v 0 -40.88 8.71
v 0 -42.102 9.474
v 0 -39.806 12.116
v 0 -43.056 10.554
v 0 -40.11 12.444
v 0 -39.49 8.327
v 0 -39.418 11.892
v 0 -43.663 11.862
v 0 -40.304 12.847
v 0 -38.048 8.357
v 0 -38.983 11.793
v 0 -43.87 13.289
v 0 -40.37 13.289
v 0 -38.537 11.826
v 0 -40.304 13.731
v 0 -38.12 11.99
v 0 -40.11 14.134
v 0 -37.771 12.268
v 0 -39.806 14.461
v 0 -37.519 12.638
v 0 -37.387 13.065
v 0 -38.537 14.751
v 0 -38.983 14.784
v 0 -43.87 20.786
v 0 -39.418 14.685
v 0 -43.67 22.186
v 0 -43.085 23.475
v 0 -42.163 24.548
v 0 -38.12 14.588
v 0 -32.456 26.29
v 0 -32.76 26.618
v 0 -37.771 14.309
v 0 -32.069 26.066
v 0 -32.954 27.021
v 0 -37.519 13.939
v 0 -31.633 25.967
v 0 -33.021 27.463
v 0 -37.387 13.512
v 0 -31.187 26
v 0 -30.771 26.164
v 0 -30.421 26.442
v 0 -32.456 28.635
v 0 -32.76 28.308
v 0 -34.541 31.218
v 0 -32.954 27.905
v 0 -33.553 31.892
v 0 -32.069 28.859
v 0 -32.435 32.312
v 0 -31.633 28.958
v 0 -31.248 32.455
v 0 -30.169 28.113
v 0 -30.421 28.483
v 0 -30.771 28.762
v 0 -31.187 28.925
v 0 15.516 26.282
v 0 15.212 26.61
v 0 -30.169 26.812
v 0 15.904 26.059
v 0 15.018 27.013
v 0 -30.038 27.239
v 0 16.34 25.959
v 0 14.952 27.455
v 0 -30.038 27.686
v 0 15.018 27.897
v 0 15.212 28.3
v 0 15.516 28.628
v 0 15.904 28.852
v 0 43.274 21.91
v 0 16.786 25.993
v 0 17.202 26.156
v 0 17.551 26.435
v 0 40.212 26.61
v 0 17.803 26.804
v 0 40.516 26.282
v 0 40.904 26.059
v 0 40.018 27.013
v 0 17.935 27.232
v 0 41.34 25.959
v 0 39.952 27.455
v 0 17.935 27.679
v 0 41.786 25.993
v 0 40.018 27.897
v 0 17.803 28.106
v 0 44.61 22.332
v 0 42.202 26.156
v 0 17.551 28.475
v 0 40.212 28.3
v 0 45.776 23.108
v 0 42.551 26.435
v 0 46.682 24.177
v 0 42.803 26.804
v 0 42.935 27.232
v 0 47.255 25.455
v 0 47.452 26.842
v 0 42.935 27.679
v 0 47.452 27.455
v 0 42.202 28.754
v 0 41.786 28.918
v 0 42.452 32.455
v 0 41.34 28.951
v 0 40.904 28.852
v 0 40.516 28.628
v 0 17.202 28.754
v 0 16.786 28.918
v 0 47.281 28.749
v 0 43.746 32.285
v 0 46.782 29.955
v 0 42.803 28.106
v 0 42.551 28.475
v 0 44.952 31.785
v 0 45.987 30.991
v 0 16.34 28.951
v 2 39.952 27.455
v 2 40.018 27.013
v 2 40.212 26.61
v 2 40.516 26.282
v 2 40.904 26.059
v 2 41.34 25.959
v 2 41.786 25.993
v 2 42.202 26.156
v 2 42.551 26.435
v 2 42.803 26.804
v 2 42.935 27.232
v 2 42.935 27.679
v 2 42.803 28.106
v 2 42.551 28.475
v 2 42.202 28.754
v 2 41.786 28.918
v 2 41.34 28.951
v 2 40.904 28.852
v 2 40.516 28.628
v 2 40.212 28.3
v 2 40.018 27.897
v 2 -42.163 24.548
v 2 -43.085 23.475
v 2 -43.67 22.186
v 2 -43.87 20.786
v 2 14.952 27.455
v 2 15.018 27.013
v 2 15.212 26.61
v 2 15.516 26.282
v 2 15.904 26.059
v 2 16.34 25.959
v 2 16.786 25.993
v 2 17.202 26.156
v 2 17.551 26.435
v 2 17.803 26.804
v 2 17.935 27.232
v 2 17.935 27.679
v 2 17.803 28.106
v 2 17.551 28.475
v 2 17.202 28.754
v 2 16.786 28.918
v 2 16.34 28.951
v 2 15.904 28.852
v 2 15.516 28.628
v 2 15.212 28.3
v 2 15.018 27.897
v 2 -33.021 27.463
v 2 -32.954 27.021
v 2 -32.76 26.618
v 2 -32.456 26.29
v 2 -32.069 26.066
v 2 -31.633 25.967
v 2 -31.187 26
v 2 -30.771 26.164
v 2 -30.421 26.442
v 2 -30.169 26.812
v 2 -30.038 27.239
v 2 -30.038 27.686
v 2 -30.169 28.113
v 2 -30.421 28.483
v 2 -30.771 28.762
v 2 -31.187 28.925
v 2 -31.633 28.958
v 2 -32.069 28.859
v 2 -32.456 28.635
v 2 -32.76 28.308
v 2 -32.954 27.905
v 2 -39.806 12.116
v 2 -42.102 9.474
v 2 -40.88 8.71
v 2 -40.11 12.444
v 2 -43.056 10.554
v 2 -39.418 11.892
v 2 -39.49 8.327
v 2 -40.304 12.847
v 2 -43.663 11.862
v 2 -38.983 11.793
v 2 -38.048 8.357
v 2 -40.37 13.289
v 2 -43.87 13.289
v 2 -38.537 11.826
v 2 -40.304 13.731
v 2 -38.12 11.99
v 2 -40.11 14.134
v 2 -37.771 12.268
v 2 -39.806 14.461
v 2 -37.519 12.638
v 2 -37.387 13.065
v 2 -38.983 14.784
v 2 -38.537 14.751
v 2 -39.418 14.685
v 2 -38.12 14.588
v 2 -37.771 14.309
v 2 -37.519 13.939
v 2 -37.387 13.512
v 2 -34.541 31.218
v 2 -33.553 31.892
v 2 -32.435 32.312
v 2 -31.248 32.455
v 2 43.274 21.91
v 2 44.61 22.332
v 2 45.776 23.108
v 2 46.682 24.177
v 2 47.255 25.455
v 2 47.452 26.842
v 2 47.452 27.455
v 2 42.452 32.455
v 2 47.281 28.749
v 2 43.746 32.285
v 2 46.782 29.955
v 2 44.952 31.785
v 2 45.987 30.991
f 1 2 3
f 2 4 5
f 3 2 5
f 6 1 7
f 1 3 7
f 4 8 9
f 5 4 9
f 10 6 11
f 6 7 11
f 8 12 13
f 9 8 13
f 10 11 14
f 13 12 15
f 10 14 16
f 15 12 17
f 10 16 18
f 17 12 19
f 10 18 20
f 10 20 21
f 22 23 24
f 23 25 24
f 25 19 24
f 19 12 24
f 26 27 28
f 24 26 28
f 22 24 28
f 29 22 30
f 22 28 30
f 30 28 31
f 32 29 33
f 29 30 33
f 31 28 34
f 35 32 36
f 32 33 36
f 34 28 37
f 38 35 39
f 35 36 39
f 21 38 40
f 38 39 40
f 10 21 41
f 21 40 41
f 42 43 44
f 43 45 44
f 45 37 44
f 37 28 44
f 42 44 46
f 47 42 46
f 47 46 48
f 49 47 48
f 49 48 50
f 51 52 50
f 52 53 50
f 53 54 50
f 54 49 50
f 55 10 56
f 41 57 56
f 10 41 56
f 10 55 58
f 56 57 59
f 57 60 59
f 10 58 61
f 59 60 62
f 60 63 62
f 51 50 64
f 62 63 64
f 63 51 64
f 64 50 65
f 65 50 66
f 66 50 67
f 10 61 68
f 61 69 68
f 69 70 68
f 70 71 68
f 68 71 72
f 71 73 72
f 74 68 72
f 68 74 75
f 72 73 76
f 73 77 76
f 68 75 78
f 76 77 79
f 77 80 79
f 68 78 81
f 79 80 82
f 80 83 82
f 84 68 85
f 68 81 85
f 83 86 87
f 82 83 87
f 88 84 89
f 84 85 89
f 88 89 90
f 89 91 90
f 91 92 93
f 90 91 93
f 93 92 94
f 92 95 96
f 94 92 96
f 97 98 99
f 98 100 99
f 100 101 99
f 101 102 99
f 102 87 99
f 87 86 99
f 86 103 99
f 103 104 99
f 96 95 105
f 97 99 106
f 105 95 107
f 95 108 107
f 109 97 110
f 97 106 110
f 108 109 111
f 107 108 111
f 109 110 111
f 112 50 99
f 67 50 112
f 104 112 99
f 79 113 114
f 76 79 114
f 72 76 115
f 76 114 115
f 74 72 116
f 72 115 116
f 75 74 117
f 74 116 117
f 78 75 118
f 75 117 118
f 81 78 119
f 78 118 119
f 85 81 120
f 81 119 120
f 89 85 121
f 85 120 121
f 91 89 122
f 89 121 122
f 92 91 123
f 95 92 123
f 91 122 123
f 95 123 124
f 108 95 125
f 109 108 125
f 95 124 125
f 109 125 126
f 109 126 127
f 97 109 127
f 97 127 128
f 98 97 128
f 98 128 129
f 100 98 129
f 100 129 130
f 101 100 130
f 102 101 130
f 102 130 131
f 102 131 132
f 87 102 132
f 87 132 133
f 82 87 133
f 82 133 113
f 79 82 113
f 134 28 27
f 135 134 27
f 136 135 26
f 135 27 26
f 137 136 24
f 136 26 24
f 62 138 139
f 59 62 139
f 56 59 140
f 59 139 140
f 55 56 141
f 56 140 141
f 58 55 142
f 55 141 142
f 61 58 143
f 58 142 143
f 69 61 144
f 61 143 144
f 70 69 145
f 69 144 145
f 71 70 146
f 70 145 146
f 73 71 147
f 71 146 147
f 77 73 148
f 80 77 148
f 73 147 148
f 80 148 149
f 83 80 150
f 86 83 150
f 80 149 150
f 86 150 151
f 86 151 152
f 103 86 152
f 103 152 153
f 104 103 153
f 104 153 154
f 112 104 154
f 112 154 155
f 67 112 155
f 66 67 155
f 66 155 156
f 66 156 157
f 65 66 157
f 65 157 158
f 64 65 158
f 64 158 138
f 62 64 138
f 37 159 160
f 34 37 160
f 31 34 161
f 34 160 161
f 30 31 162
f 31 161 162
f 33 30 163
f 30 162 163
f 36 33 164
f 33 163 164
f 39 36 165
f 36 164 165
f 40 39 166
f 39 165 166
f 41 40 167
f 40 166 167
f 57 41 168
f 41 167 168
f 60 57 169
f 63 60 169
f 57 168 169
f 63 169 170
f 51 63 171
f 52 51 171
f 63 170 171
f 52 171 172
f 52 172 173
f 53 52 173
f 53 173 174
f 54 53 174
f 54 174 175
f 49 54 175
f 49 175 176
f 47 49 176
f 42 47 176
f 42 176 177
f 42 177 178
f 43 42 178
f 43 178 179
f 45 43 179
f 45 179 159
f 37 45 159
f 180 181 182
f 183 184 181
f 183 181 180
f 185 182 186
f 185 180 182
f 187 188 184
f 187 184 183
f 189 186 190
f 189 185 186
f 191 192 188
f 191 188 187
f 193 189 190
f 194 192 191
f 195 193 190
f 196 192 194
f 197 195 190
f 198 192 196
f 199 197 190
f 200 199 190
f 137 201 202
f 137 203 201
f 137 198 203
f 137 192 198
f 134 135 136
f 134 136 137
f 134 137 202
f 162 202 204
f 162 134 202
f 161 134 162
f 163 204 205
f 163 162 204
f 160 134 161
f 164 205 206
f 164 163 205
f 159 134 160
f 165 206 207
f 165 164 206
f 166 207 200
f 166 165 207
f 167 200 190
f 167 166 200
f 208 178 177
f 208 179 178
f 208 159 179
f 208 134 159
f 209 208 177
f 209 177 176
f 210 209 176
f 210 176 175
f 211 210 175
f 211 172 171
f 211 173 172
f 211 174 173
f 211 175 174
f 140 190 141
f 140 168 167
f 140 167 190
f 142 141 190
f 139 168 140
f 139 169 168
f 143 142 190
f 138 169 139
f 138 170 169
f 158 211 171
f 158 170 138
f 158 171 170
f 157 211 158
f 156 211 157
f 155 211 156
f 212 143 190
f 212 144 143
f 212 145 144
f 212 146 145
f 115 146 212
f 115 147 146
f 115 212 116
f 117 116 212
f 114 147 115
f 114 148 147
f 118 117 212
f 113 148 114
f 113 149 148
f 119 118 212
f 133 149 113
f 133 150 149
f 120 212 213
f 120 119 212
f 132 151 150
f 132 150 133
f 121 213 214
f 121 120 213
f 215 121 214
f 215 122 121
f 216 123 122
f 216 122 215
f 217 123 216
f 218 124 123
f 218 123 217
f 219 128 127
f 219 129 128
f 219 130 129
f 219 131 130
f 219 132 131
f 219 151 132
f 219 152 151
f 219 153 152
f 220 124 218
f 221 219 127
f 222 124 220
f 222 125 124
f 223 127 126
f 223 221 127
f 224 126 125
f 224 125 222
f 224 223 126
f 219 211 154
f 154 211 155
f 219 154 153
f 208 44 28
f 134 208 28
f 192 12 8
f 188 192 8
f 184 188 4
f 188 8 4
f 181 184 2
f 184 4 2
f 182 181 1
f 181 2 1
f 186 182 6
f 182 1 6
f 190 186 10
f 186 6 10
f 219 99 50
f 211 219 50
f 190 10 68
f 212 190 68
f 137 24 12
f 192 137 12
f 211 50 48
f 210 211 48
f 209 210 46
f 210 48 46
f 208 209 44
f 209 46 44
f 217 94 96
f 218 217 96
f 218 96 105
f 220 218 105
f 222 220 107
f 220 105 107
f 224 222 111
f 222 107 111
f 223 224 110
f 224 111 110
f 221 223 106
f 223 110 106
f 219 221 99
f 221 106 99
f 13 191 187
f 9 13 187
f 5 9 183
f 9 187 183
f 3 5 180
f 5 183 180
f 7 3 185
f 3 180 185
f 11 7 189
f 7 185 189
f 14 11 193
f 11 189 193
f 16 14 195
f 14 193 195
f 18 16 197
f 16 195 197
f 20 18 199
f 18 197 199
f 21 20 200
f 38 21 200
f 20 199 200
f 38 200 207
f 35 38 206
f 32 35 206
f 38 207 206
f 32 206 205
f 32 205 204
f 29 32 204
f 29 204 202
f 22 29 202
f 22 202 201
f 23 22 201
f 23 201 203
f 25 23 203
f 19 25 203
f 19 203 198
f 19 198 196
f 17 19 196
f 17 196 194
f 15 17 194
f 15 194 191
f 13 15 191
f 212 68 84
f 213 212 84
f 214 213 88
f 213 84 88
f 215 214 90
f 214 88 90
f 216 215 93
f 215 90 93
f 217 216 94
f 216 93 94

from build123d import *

# Parameters (mm, degrees)
F1_DEPTH = 2
F3_D     = 3
F5_D     = 3


with BuildPart() as f1:
    # F0 (on Right) → F1 (new body)
    with BuildSketch(Plane.YZ):
        with BuildLine():
            Line((42.4517345428, 32.4551947415), (-31.2479986618, 32.4551947415))
            ThreePointArc((-31.2479986618, 32.4551947415), (-33.0066323151, 32.1357083536), (-34.540522163, 31.2180778109))
            Line((-34.540522163, 31.2180778109), (-42.1629837432, 24.5484222763))
            ThreePointArc((-42.1629837432, 24.5484222763), (-43.4236249385, 22.8516203396), (-43.870460242, 20.7855392069))
            Line((-43.870460242, 20.7855392069), (-43.870460242, 13.2886583044))
            ThreePointArc((-43.870460242, 13.2886583044), (-42.1023347006, 9.4735583733), (-38.0484652484, 8.3566886947))
            Line((-38.0484652484, 8.3566886947), (43.2737295365, 21.9103887931))
            ThreePointArc((43.2737295365, 21.9103887931), (46.2668344739, 23.6104839442), (47.4517345428, 26.8423584027))
            Line((47.4517345428, 26.8423584027), (47.4517345428, 27.4551947415))
            ThreePointArc((47.4517345428, 27.4551947415), (45.9872684488, 30.9907286474), (42.4517345428, 32.4551947415))
        make_face()
    extrude(amount=F1_DEPTH)

    # F3 (through all)
    with Locations(Plane(origin=(0, 0, 0), x_dir=(0, 1, 0), z_dir=(-1, 0, 0))):
        with Locations((41.4517345428, -27.4551947415), (16.4517345428, -27.4551947415)):
            Hole(F3_D / 2)

    # F5 (through all)
    with Locations(Plane(origin=(0, 0, 0), x_dir=(0, 1, 0), z_dir=(-1, 0, 0))):
        with Locations((-31.5209182738, -27.4626488093), (-38.870460242, -13.2886583044)):
            Hole(F5_D / 2)


solid = f1.part
